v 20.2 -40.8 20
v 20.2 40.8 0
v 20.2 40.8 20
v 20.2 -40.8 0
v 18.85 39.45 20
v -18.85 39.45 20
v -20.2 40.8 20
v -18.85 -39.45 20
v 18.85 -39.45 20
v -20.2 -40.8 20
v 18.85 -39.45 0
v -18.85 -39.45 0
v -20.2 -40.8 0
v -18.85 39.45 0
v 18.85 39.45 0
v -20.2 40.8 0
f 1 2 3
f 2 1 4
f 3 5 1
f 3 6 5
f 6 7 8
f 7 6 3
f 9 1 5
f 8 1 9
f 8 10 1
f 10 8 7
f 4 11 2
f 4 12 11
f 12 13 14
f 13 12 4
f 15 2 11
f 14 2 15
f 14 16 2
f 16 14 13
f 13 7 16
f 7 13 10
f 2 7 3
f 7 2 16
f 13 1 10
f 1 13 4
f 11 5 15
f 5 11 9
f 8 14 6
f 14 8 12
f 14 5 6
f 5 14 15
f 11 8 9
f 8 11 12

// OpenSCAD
// file: bentobox.layout.scad
// SPDX-FileCopyrightText: 2026 Alon A. Rabinowitz
// SPDX-License-Identifier: CC-BY-NC-SA-4.0
// A remix of BentoBox v2.0 by ThrutheFrame (https://www.printables.com/model/272525), CC BY-NC-SA 4.0.

// What follows from bentobox.params.scad: the section's heights, where every part of the stack stands, and
// the rules as asserts (impossible) and warnings (builds, but compromised).
include <bentobox.params.scad>

eps = 0.01;
bead = fdm_extrusion_w;
perim3 = 3 * fdm_extrusion_w;

// The section, face to face: the grid, the sheet, the air above it. Its tongue stands above that.
sec_h = grid_t + sheet_t + plenum_h;
ledge_w = ledge_beads * bead;
rib_w = grid_beads * bead;

// The stack, bottom up: the Z of each part's bottom face, with the section or without.
function stack(with_section) = let(
    fans_z = duct_h,
    sec_z = fans_z + fans_h,
    carbon_z = sec_z + (with_section ? sec_h : 0),
    hepa_z = carbon_z + carbon_h
) [fans_z, sec_z, carbon_z, hepa_z, hepa_z + hepa_h + cover_top];
// [fan case, section, carbon housing, HEPA holder, the cover's top]

// The C-MAG's three trays, standing: each tray's pellets fall onto the grill below them and spread over the
// whole of the C-MAG's inside. Lying open, a tray between two grills is (spacing - grill) long and the
// inside's W - 4 wide; standing, the same pellets cover (W - 4) x (T - 4). The ribs that hold the grills,
// and the corners' fillets, take about 4 % of a tray either way, and cancel to well under 0.1 mm.
cmag_in = [cmag[1] - 4, cmag[2] - 4];                          // W x T inside its walls
cmag_tray = cmag_grills[1] - cmag_grills[0] - cmag_grill_t;    // a tray's length between two grills
cmag_layer = cmag_tray * cmag_fill / cmag_in[1];               // its pellets' depth, standing
cmag_z0 = carbon_floor;                                         // the C-MAG's bottom, on the housing's floor
// Each layer's bottom: the top face of the grill under it, from the C-MAG's bottom.
cmag_layers = [for (i = [0 : 2]) cmag_grills[i] + cmag_grill_t / 2];

// The frame for your own HEPA paper. The ring stands on the HEPA holder's ledge, in its pocket; the paper
// fills it with its folds along Y, and a cap closes each end. The piece's two long edges are cut along a
// top fold, so it holds a whole number of pleats across: as many as come nearest the ring's inside,
// stretched or squeezed to fill it, as a pleated pack will - and the caps' wedges are spaced to match.
ring_wall = ring_beads * bead;
ring_out = [in_w - 2 * ring_play, hepa_pocket_l - 2 * ring_play];   // X, Y
ring_in = ring_out - 2 * [ring_wall, ring_wall];
ring_h = paper_depth;
pack_n = max(1, round(ring_in[0] / paper_pitch));   // pleats across: the channels open at the top
pack_pitch = ring_in[0] / pack_n;
pack_l = ring_in[1] - 2 * cap_plate;                 // the piece's length, along the folds
// Seen along the folds, the paper's middle runs from a top fold paper_t / 2 under the pack's top face to a
// bottom fold paper_t / 2 over its bottom, leaning pleat_alpha from upright. A channel open at the top is
// what lies inside the paper's faces, between two top folds: its sides are those middles moved
// paper_t / (2 cos(alpha)) sideways, so its bottom is paper_t / (2 sin(alpha)) above the bottom fold's middle
// - in a narrow pleat, millimetres, not the paper's thickness. Each wedge is that channel's shape.
pleat_alpha = atan((pack_pitch / 2) / (paper_depth - paper_t));
wedge_w = 2 * ((paper_depth - paper_t / 2) * tan(pleat_alpha) - paper_t / (2 * cos(pleat_alpha)));   // at the top face
wedge_z0 = paper_t / 2 + paper_t / (2 * sin(pleat_alpha));    // its point, above the pack's bottom face

assert(wedge_w > 0, "the pleats are too narrow for the paper's thickness: no channel is left to close");
assert(pack_l > 2 * cap_wedge_l + 10, "the ring is too short for its caps' wedges");
assert(hepa_ledge + ring_h < hepa_h - 1, "the paper is deeper than the HEPA holder is tall");

assert(grid_t >= groove_h + 2 * fdm_layer_h, "the grid's rim must roof the groove in the section's bottom");
assert(ledge_w > -groove_in, "the ledge must reach past the groove's inner face");
assert(cmag[0] < carbon_h - carbon_floor, "the C-MAG must stand inside the carbon housing");

// Wall between a magnet's hole and the joint's tongue or groove, whichever reaches further out. The originals
// have the same holes at the same places: 1.0 mm, so the section has what every BentoBox part has.
mag_to_inside = norm([mag_xy[0] - (in_w / 2 - in_r), mag_xy[1] - (in_l / 2 - in_r)]) - in_r;
mag_wall = mag_to_inside - mag_d / 2 - max(tongue_base, groove_out);
assert(mag_wall > 2 * bead, "a magnet's hole must not break into the joint's groove");

warns = [
    if (ledge_w + groove_in < 2 * bead - 1e-9) str("the groove's inner wall is ", ledge_w + groove_in, " mm, under two beads"),
    if (plenum_h < 3) str("only ", plenum_h, " mm of air above the sheet: the openings above will load it unevenly"),
    if (abs(pack_pitch / paper_pitch - 1) > 0.1)
        str("the paper is ", pack_pitch > paper_pitch ? "stretched" : "squeezed", " ", round(100 * abs(pack_pitch / paper_pitch - 1)),
            " % to fill the ring: ", pack_n, " pleats in ", ring_in[0], " mm"),
    if (wedge_w < 2 * bead - 1e-9) str("the caps' wedges are ", wedge_w, " mm wide at the top, under two beads: they may not print"),
];
for (w = warns) echo(str("WARNING: ", w));
// main file
// SPDX-FileCopyrightText: 2026 Alon A. Rabinowitz
// SPDX-License-Identifier: CC-BY-NC-SA-4.0
// A remix of BentoBox v2.0 by ThrutheFrame (https://www.printables.com/model/272525), CC BY-NC-SA 4.0.

// The ring for your own HEPA paper, in ASA, on its own: everything is in bentobox.scad, and this file only
// pins the part. Other paper: change paper_depth, paper_pitch and paper_t in bentobox.params.scad.
include <bentobox.scad>
part = "hepa_ring";
